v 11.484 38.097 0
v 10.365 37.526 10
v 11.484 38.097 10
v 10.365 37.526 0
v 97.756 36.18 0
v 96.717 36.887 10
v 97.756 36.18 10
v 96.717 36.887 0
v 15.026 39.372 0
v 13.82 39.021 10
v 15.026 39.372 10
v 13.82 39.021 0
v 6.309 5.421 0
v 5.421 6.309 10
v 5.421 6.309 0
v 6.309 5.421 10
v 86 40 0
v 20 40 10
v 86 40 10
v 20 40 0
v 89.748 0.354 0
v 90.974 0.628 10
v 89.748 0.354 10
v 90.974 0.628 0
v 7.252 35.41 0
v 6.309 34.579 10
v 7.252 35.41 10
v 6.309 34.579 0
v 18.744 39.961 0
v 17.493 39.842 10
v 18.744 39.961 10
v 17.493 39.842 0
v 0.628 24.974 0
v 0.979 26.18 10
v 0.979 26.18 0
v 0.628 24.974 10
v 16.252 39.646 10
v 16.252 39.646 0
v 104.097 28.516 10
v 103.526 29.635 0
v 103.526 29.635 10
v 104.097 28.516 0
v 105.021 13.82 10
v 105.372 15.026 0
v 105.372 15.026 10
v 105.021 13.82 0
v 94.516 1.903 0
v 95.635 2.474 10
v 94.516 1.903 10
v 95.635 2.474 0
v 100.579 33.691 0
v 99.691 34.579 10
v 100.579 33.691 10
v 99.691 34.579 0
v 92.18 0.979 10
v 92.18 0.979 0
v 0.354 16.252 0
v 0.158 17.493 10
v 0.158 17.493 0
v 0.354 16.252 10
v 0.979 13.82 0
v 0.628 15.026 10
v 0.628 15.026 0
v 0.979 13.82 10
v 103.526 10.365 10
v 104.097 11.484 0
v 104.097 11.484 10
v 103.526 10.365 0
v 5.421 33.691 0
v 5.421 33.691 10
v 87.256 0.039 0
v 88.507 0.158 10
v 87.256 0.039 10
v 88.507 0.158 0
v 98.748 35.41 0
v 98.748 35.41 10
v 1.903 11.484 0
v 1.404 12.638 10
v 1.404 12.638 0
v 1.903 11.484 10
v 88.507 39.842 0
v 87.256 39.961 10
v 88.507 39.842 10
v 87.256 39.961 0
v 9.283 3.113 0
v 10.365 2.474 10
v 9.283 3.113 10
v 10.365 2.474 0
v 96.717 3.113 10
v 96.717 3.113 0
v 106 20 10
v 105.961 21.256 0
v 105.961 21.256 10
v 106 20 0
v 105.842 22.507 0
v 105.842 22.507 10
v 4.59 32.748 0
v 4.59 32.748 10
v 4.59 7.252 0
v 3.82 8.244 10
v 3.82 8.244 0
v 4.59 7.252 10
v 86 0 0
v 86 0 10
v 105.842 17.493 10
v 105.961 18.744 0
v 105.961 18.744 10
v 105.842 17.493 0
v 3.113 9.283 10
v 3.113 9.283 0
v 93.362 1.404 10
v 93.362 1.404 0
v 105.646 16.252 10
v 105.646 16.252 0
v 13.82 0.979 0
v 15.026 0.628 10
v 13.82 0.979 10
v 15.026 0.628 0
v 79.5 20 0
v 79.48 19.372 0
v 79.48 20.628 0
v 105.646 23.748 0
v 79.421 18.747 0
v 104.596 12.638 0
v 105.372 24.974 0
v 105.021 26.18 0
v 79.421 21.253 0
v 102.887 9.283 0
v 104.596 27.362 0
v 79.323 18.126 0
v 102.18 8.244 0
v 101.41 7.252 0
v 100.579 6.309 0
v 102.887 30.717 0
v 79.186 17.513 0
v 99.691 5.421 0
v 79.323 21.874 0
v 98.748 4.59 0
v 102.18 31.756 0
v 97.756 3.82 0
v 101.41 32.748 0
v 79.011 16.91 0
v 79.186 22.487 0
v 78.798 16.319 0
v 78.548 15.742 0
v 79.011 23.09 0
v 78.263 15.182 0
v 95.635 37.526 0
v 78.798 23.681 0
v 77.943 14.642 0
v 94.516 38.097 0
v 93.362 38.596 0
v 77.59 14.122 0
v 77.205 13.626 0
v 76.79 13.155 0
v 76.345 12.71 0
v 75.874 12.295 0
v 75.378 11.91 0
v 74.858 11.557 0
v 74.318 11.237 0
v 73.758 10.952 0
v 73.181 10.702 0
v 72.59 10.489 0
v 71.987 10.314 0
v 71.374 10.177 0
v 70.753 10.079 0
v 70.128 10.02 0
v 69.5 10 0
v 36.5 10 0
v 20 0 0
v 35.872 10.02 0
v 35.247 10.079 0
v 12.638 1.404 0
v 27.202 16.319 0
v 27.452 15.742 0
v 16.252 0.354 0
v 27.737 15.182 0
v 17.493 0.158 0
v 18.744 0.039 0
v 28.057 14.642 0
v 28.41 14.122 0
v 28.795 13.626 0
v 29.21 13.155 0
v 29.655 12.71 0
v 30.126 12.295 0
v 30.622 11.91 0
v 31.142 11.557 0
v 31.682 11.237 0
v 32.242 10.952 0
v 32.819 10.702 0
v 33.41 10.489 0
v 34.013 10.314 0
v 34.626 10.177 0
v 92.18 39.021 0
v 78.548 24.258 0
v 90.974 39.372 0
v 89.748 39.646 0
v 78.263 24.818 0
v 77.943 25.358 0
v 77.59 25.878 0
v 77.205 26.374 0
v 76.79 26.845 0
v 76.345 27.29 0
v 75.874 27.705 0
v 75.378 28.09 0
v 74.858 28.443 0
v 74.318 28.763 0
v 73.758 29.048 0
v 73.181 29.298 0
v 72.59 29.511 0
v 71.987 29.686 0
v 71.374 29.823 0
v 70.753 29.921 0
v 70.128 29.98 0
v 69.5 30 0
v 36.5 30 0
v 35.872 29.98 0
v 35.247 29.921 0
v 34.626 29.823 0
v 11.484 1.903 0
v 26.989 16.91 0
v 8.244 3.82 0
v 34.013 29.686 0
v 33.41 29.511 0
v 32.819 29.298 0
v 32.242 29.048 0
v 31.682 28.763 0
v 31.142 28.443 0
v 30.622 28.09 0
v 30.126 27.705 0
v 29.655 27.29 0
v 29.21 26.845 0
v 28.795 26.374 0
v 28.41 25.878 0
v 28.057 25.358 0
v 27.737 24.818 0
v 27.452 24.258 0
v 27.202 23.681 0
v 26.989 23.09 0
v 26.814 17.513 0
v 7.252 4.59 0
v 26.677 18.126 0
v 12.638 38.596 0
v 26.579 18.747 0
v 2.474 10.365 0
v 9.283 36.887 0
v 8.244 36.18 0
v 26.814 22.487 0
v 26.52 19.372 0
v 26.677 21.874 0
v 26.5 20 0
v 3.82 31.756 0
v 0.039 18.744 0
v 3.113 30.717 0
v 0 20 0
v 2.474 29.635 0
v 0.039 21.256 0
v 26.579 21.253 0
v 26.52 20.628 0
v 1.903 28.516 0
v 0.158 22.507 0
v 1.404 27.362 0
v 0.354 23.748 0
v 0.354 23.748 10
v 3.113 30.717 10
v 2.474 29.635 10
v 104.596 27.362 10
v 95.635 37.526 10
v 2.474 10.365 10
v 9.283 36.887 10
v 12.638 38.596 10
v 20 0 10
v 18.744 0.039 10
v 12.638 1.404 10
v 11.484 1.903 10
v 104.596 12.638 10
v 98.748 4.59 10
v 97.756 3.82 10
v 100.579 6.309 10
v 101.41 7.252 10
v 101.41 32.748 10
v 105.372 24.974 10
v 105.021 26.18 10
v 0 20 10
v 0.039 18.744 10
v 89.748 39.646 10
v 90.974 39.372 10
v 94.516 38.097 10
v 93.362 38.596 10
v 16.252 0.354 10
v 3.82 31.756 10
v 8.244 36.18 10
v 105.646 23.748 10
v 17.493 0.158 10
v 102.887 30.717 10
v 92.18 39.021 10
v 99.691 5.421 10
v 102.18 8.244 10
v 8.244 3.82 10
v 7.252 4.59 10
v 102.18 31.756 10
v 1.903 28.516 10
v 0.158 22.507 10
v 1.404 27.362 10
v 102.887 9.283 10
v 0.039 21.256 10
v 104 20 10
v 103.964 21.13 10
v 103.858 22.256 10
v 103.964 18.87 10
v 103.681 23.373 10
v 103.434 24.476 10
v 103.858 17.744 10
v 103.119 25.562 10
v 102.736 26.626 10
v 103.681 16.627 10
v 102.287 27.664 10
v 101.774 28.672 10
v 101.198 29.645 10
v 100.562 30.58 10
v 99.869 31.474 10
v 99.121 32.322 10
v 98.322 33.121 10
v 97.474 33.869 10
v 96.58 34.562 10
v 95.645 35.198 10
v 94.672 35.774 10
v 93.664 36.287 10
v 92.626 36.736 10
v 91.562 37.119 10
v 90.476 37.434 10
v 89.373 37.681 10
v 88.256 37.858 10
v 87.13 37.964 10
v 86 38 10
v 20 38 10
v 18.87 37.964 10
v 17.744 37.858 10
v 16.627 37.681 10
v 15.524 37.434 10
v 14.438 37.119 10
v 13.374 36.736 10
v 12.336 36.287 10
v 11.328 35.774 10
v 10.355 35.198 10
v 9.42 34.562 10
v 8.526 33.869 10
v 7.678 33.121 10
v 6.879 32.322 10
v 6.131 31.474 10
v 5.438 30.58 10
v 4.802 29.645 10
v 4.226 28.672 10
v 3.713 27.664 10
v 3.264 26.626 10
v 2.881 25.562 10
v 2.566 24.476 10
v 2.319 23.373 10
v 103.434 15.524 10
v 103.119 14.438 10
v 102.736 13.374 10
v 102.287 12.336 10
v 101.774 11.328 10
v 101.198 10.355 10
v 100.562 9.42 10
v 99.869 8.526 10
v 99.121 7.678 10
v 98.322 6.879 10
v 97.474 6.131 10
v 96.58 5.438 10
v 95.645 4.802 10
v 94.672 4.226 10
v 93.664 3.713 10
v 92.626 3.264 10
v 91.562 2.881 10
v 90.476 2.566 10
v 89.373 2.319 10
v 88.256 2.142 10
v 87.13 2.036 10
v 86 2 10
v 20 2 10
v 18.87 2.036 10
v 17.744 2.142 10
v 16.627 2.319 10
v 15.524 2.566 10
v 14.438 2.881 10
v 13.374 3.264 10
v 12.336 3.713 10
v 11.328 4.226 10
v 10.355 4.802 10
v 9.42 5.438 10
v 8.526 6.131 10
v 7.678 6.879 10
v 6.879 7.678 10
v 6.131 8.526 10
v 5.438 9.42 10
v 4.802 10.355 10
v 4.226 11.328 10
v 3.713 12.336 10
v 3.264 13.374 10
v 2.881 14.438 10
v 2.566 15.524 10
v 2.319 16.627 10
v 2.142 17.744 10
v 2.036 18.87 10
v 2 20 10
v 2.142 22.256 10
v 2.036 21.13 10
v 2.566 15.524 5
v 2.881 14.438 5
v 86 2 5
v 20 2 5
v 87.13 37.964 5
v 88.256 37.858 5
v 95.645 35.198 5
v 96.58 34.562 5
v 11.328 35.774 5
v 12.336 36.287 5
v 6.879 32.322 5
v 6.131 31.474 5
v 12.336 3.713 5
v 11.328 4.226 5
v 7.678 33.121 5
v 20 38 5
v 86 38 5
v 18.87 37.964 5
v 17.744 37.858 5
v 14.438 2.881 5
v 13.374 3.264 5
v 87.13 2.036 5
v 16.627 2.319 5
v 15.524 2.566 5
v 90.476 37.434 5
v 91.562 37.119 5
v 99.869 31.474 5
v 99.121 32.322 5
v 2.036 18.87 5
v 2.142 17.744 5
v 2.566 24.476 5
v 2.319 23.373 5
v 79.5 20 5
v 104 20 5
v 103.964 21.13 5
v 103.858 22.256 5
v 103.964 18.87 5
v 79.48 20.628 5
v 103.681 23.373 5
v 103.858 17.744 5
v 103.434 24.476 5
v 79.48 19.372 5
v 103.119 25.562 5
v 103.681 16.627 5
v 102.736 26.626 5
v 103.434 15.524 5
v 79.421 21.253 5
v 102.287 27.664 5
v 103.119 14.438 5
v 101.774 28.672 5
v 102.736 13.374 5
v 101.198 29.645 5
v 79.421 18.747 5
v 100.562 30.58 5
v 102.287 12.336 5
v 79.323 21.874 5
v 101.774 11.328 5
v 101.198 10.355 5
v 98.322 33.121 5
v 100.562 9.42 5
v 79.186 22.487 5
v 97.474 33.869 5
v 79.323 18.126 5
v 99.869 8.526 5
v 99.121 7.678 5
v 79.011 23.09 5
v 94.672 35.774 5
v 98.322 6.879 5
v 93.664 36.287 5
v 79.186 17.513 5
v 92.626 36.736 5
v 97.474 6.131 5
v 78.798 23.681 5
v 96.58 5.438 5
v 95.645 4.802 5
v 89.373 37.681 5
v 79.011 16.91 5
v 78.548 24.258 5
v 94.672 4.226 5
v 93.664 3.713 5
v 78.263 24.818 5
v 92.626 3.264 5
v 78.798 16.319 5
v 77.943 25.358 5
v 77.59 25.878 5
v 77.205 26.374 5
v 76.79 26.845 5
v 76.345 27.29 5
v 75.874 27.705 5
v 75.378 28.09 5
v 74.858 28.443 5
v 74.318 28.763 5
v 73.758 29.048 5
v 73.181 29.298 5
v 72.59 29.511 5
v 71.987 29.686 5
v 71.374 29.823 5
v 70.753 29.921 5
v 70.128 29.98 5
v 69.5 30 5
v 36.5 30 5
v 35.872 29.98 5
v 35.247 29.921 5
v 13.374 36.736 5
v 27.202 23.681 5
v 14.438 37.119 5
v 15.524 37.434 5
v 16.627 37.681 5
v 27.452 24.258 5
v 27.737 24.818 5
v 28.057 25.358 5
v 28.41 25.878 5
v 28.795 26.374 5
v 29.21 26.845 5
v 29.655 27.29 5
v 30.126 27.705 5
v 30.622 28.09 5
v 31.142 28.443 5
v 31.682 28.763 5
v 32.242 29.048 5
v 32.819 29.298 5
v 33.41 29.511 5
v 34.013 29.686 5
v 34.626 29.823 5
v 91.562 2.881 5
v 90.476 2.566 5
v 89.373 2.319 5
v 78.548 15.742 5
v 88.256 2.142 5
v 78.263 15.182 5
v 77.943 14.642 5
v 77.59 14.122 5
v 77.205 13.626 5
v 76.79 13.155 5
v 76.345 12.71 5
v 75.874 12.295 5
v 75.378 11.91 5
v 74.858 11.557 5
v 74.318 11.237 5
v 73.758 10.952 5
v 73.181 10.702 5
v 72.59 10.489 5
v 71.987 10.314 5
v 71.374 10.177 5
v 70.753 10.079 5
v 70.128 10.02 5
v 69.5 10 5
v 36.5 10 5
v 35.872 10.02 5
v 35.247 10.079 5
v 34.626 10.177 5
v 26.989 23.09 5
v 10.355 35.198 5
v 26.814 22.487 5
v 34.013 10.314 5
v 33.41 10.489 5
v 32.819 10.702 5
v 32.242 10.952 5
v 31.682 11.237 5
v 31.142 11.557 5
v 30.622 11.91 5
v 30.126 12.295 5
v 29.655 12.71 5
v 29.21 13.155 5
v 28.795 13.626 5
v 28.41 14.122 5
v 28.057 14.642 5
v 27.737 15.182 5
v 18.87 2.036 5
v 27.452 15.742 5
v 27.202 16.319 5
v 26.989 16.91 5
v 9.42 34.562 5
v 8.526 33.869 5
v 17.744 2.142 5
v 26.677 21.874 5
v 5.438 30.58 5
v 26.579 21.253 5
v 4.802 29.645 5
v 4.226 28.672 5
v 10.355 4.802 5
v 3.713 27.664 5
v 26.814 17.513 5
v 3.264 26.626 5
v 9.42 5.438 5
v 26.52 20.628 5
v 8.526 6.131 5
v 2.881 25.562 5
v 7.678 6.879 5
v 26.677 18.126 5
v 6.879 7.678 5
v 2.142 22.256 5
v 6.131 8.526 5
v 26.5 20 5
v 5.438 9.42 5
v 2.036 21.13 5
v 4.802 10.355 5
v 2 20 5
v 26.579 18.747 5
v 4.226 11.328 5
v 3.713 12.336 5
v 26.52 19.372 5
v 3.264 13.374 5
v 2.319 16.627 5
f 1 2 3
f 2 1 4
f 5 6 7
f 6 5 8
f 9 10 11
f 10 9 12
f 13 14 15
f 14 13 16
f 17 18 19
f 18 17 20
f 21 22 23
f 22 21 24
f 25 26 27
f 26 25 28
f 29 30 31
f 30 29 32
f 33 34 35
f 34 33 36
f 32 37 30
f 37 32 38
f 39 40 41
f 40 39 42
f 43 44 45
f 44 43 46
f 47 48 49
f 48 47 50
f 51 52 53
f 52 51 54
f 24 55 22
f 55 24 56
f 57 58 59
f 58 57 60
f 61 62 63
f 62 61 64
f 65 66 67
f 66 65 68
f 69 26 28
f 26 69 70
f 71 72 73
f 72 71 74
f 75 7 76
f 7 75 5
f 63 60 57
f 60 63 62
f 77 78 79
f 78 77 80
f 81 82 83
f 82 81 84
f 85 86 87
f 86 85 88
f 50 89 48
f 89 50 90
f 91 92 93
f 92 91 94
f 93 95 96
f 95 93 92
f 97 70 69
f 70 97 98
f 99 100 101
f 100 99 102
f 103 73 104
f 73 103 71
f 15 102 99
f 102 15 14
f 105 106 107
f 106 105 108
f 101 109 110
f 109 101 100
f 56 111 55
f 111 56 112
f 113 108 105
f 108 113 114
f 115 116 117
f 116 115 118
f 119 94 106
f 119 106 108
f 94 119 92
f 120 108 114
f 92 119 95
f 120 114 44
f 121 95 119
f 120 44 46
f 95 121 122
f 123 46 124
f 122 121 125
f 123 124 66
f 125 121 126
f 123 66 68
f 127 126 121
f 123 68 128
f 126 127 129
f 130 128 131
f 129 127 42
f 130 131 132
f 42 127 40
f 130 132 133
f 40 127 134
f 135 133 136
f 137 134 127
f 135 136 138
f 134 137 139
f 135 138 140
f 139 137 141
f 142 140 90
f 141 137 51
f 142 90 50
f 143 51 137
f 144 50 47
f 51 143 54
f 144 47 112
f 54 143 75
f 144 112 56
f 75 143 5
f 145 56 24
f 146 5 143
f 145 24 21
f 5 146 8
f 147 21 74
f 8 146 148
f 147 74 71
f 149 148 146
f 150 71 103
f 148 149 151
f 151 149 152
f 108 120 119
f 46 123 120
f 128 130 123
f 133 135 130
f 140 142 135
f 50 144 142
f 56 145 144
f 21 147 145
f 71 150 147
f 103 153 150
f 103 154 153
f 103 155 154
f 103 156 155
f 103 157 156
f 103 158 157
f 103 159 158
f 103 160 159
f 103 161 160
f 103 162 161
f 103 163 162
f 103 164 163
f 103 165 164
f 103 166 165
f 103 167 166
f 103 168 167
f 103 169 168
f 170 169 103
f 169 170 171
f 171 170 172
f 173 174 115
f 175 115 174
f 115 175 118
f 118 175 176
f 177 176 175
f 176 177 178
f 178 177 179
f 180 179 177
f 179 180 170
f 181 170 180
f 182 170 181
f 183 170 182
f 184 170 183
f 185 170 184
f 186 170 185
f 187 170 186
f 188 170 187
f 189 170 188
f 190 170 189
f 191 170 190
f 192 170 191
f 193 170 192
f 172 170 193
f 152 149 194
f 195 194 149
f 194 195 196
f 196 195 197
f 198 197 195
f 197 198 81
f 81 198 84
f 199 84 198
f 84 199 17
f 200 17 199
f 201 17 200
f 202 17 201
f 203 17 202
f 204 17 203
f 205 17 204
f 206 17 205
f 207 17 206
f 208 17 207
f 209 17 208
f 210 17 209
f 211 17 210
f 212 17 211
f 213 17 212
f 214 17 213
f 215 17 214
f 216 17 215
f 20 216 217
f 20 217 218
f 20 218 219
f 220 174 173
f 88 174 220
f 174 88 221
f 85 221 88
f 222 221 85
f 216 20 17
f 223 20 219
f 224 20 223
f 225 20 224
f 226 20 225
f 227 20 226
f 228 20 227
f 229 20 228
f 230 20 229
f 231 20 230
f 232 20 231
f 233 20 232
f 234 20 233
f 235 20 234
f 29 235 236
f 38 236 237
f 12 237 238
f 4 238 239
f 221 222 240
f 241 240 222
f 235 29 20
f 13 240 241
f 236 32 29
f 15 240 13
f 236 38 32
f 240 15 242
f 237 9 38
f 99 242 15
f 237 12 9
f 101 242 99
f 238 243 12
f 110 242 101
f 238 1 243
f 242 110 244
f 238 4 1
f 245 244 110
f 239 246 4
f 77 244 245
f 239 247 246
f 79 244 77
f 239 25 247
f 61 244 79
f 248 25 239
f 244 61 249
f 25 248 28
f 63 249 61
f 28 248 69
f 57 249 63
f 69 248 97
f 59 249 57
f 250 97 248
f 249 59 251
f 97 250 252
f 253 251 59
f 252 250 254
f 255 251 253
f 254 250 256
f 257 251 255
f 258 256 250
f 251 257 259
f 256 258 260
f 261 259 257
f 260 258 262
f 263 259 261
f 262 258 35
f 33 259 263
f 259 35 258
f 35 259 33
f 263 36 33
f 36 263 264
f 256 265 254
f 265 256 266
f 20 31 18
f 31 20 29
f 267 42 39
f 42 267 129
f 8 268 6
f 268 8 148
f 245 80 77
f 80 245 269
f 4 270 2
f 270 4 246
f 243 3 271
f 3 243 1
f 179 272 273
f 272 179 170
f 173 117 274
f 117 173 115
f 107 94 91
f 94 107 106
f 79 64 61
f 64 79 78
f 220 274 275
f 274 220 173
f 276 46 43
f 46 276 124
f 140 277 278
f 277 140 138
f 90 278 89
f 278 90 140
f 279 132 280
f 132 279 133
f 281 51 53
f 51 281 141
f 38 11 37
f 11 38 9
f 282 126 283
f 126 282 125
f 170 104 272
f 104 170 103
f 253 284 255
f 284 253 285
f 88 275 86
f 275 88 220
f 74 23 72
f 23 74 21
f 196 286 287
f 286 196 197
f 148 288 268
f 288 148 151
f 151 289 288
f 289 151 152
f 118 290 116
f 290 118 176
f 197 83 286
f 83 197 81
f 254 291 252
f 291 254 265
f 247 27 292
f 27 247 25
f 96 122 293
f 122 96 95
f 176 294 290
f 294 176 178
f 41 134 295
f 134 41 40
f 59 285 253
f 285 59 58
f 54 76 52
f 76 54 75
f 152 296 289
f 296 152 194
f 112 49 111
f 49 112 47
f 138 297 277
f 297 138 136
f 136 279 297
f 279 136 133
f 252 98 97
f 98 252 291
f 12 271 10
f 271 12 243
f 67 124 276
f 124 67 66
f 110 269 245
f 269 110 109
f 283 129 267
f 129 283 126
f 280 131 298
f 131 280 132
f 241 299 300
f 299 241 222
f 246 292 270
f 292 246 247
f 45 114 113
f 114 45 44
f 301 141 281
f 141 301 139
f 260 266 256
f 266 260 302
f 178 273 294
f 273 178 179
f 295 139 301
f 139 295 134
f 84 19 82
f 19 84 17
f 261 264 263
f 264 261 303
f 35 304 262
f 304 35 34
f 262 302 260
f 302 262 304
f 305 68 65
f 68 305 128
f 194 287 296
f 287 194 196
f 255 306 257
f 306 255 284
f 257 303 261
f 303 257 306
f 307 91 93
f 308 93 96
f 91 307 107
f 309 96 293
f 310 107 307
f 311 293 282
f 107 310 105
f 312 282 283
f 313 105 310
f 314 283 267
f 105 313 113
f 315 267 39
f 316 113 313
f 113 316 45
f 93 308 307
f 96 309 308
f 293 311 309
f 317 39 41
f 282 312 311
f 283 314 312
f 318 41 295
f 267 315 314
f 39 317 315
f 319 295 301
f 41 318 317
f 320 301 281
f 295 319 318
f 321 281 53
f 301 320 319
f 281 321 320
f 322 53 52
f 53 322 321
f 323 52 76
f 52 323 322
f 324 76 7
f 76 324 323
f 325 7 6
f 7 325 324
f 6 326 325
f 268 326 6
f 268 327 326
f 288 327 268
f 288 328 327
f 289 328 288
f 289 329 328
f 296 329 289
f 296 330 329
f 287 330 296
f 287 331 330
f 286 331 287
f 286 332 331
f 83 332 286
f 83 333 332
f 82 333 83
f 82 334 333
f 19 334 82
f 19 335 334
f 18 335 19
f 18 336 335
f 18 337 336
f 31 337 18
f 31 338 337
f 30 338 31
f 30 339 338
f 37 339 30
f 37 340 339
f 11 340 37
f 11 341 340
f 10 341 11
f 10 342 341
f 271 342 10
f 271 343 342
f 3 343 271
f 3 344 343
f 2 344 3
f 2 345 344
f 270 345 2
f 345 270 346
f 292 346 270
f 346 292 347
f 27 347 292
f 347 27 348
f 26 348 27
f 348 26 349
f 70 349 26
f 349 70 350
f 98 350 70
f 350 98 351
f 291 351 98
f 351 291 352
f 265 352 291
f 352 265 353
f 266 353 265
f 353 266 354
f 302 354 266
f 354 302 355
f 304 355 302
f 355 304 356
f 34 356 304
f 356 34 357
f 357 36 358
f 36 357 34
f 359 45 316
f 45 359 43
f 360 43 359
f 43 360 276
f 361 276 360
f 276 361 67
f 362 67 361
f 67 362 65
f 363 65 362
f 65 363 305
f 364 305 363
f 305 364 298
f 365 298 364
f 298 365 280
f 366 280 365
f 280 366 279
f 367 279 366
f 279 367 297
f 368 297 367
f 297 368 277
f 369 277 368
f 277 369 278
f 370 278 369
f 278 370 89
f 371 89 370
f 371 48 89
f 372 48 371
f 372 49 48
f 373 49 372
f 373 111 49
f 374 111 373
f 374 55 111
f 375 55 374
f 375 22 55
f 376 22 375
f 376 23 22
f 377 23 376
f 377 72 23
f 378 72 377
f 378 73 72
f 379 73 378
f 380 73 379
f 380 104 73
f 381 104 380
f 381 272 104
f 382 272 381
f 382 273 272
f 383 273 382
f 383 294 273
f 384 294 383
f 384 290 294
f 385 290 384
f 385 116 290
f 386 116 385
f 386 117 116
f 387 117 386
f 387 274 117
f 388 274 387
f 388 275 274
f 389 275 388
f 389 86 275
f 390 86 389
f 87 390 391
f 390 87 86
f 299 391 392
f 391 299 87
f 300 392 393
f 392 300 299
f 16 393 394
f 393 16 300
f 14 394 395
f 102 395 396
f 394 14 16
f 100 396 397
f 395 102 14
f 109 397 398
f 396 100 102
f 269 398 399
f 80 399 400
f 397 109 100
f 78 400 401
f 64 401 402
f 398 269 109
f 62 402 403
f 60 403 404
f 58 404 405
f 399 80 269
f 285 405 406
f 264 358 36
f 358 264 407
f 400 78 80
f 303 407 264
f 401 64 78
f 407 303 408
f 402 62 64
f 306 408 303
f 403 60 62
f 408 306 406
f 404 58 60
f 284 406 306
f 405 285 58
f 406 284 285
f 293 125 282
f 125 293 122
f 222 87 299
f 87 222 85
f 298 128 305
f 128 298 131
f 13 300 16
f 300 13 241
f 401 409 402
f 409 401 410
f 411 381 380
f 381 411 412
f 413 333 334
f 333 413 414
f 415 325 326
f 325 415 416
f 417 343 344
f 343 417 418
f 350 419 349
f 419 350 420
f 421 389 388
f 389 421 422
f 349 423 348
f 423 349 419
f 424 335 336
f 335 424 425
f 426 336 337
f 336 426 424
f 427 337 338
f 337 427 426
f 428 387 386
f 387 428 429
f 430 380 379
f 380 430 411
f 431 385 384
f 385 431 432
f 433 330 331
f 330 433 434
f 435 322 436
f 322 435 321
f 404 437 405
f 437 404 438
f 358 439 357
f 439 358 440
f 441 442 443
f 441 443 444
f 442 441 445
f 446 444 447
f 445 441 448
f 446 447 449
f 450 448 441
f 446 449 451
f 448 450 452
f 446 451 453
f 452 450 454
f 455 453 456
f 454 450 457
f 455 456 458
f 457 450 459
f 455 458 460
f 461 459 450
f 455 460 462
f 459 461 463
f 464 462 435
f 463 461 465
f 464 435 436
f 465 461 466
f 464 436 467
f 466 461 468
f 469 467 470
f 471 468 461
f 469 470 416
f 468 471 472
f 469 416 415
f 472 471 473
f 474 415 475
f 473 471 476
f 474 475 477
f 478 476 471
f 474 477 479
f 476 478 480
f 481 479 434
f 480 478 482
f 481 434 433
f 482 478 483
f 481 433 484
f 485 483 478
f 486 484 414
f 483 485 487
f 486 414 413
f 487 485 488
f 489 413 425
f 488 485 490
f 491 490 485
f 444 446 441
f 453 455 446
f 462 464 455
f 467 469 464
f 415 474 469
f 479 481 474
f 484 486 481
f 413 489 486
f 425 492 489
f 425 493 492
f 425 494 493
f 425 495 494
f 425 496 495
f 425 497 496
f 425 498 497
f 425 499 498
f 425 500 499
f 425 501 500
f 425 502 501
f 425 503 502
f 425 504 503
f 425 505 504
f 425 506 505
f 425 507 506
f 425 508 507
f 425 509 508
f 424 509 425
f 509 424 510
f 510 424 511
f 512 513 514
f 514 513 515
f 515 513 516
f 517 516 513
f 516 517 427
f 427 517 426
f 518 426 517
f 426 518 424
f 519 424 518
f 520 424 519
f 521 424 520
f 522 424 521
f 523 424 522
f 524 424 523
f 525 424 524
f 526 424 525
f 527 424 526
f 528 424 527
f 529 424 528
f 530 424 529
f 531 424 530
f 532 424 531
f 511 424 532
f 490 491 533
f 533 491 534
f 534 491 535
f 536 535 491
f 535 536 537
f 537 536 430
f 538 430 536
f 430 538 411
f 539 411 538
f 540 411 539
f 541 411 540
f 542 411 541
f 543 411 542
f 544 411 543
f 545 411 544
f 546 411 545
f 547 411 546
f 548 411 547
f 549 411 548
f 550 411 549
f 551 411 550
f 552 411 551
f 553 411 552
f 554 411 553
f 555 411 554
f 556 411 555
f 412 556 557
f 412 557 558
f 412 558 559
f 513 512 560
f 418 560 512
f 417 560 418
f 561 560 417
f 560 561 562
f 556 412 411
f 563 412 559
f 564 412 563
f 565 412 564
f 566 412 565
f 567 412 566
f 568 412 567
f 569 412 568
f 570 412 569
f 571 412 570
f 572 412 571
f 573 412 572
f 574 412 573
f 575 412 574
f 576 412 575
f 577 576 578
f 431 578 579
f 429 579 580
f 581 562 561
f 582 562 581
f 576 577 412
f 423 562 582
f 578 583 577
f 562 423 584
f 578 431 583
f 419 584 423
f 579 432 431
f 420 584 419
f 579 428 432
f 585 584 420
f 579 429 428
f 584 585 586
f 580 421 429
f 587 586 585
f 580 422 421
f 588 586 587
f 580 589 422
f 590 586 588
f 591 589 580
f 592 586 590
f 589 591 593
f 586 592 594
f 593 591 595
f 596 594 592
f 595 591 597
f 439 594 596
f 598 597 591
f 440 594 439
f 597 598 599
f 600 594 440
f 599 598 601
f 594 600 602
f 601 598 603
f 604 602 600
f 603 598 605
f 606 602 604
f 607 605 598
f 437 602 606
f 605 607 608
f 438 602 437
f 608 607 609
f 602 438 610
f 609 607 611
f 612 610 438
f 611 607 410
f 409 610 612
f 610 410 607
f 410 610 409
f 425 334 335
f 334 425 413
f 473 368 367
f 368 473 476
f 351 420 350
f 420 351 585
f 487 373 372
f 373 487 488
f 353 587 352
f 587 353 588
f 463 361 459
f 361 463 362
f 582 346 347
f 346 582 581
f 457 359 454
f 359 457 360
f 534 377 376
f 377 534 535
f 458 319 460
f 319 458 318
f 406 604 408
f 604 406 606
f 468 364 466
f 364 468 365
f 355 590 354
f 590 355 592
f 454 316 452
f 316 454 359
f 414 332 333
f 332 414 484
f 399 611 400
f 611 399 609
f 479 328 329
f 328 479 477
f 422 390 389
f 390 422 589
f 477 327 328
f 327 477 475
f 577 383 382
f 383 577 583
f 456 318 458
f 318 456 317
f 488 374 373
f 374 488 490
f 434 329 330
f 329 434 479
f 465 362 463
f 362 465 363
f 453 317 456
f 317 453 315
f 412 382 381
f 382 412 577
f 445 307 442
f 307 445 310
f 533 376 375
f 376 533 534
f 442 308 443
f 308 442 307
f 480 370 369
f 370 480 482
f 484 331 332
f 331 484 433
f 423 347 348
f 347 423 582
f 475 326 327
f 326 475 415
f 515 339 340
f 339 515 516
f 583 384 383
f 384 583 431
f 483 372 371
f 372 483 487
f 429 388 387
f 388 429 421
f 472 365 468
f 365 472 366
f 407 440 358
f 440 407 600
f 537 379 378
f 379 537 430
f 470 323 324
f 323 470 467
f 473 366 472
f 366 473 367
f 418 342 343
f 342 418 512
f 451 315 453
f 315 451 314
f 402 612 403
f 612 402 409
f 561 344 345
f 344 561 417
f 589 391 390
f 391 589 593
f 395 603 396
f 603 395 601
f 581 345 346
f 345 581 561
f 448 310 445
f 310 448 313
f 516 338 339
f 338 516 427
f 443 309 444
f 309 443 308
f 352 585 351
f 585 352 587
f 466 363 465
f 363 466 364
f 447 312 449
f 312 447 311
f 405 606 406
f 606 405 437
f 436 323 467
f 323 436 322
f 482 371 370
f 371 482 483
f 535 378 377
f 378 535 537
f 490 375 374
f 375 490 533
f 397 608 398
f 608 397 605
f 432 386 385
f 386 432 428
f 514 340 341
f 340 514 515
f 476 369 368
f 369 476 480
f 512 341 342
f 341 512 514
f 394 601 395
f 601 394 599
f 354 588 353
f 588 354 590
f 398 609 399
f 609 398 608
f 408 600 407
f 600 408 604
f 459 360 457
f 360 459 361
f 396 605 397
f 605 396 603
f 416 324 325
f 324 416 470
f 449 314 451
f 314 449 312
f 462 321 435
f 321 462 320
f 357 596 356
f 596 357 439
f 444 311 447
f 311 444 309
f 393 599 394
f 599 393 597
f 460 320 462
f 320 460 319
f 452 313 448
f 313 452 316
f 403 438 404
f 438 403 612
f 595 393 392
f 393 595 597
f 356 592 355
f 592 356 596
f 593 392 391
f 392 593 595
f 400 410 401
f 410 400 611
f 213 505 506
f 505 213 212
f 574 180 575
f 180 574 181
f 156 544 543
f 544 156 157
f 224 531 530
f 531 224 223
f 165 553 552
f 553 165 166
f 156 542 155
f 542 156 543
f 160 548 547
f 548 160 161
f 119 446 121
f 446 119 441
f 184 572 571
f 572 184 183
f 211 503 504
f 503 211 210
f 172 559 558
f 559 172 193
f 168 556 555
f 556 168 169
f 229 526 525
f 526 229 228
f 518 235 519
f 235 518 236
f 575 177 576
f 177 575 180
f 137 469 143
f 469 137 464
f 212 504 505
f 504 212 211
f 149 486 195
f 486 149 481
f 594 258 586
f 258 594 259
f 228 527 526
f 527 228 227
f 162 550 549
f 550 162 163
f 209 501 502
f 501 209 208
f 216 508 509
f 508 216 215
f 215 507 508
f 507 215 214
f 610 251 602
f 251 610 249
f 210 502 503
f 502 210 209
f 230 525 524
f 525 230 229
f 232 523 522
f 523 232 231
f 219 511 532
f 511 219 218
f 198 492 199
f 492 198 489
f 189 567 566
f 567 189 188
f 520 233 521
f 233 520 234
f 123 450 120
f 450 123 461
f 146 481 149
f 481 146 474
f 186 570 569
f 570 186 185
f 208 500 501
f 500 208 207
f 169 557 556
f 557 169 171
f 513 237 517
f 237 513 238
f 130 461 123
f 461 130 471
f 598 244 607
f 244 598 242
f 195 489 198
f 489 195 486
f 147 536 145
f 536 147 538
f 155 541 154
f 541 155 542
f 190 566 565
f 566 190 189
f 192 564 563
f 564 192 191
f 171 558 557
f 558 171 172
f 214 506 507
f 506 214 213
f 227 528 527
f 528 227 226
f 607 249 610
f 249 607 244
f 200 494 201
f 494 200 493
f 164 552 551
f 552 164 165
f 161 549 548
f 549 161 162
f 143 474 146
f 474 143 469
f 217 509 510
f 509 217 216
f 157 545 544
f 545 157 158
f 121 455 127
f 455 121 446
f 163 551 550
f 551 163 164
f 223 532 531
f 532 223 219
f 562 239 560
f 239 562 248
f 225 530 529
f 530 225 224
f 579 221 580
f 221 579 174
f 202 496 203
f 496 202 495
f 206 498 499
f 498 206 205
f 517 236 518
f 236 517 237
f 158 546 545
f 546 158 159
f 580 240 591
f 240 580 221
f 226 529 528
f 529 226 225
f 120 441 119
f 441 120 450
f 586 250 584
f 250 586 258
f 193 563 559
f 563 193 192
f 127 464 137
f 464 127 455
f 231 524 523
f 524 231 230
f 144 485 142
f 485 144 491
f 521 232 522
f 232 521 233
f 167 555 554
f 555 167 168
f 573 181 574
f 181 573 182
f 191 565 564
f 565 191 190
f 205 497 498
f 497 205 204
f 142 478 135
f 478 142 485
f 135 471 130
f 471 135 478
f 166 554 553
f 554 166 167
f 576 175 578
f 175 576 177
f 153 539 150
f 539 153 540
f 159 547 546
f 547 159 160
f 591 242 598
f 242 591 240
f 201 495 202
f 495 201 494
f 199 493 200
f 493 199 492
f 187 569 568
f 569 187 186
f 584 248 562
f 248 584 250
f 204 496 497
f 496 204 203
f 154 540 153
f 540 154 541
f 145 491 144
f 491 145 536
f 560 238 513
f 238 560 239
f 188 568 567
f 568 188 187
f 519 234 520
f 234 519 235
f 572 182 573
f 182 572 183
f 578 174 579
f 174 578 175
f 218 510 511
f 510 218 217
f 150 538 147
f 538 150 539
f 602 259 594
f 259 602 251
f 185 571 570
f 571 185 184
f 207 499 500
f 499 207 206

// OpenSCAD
/*
3499 x 10200
*/

width = 106;
depth = 40; //Was 35s
height = 10;
wall = 2;
thickness=3;




function totalLength(w,d) = w+d;
function squareLength(tw,d) = tw - d;
function radius(d) = d/2;
function focus2(w,d)=w-radius(d);

module oval(w, d, h)
{
    hull()
    {
        translate([focus2(w,d), radius(d), 0])
        cylinder($fn=100, h, d=d, false);
        
        translate([radius(d), radius(d), 0])
        cylinder($fn=100, h, d=d, false);
    }
}

module ovalWall(w, d, h, wall)
{
    difference()
    {
    oval(w, d, h);
    translate([wall,wall,h/2])
        oval(w-(2*wall), d-(2*wall), h*wall);
    }
}

difference()
{
    ovalWall(width, depth, height, wall);
    translate([width/4, depth/4,-wall])
    oval(width/2, depth/2, 20);
    
//        ovalWall(102, 34.9, 3, 2);
//    translate([51/2, 17.5/2,-2])
//    oval(51, 17.5,20);
}
